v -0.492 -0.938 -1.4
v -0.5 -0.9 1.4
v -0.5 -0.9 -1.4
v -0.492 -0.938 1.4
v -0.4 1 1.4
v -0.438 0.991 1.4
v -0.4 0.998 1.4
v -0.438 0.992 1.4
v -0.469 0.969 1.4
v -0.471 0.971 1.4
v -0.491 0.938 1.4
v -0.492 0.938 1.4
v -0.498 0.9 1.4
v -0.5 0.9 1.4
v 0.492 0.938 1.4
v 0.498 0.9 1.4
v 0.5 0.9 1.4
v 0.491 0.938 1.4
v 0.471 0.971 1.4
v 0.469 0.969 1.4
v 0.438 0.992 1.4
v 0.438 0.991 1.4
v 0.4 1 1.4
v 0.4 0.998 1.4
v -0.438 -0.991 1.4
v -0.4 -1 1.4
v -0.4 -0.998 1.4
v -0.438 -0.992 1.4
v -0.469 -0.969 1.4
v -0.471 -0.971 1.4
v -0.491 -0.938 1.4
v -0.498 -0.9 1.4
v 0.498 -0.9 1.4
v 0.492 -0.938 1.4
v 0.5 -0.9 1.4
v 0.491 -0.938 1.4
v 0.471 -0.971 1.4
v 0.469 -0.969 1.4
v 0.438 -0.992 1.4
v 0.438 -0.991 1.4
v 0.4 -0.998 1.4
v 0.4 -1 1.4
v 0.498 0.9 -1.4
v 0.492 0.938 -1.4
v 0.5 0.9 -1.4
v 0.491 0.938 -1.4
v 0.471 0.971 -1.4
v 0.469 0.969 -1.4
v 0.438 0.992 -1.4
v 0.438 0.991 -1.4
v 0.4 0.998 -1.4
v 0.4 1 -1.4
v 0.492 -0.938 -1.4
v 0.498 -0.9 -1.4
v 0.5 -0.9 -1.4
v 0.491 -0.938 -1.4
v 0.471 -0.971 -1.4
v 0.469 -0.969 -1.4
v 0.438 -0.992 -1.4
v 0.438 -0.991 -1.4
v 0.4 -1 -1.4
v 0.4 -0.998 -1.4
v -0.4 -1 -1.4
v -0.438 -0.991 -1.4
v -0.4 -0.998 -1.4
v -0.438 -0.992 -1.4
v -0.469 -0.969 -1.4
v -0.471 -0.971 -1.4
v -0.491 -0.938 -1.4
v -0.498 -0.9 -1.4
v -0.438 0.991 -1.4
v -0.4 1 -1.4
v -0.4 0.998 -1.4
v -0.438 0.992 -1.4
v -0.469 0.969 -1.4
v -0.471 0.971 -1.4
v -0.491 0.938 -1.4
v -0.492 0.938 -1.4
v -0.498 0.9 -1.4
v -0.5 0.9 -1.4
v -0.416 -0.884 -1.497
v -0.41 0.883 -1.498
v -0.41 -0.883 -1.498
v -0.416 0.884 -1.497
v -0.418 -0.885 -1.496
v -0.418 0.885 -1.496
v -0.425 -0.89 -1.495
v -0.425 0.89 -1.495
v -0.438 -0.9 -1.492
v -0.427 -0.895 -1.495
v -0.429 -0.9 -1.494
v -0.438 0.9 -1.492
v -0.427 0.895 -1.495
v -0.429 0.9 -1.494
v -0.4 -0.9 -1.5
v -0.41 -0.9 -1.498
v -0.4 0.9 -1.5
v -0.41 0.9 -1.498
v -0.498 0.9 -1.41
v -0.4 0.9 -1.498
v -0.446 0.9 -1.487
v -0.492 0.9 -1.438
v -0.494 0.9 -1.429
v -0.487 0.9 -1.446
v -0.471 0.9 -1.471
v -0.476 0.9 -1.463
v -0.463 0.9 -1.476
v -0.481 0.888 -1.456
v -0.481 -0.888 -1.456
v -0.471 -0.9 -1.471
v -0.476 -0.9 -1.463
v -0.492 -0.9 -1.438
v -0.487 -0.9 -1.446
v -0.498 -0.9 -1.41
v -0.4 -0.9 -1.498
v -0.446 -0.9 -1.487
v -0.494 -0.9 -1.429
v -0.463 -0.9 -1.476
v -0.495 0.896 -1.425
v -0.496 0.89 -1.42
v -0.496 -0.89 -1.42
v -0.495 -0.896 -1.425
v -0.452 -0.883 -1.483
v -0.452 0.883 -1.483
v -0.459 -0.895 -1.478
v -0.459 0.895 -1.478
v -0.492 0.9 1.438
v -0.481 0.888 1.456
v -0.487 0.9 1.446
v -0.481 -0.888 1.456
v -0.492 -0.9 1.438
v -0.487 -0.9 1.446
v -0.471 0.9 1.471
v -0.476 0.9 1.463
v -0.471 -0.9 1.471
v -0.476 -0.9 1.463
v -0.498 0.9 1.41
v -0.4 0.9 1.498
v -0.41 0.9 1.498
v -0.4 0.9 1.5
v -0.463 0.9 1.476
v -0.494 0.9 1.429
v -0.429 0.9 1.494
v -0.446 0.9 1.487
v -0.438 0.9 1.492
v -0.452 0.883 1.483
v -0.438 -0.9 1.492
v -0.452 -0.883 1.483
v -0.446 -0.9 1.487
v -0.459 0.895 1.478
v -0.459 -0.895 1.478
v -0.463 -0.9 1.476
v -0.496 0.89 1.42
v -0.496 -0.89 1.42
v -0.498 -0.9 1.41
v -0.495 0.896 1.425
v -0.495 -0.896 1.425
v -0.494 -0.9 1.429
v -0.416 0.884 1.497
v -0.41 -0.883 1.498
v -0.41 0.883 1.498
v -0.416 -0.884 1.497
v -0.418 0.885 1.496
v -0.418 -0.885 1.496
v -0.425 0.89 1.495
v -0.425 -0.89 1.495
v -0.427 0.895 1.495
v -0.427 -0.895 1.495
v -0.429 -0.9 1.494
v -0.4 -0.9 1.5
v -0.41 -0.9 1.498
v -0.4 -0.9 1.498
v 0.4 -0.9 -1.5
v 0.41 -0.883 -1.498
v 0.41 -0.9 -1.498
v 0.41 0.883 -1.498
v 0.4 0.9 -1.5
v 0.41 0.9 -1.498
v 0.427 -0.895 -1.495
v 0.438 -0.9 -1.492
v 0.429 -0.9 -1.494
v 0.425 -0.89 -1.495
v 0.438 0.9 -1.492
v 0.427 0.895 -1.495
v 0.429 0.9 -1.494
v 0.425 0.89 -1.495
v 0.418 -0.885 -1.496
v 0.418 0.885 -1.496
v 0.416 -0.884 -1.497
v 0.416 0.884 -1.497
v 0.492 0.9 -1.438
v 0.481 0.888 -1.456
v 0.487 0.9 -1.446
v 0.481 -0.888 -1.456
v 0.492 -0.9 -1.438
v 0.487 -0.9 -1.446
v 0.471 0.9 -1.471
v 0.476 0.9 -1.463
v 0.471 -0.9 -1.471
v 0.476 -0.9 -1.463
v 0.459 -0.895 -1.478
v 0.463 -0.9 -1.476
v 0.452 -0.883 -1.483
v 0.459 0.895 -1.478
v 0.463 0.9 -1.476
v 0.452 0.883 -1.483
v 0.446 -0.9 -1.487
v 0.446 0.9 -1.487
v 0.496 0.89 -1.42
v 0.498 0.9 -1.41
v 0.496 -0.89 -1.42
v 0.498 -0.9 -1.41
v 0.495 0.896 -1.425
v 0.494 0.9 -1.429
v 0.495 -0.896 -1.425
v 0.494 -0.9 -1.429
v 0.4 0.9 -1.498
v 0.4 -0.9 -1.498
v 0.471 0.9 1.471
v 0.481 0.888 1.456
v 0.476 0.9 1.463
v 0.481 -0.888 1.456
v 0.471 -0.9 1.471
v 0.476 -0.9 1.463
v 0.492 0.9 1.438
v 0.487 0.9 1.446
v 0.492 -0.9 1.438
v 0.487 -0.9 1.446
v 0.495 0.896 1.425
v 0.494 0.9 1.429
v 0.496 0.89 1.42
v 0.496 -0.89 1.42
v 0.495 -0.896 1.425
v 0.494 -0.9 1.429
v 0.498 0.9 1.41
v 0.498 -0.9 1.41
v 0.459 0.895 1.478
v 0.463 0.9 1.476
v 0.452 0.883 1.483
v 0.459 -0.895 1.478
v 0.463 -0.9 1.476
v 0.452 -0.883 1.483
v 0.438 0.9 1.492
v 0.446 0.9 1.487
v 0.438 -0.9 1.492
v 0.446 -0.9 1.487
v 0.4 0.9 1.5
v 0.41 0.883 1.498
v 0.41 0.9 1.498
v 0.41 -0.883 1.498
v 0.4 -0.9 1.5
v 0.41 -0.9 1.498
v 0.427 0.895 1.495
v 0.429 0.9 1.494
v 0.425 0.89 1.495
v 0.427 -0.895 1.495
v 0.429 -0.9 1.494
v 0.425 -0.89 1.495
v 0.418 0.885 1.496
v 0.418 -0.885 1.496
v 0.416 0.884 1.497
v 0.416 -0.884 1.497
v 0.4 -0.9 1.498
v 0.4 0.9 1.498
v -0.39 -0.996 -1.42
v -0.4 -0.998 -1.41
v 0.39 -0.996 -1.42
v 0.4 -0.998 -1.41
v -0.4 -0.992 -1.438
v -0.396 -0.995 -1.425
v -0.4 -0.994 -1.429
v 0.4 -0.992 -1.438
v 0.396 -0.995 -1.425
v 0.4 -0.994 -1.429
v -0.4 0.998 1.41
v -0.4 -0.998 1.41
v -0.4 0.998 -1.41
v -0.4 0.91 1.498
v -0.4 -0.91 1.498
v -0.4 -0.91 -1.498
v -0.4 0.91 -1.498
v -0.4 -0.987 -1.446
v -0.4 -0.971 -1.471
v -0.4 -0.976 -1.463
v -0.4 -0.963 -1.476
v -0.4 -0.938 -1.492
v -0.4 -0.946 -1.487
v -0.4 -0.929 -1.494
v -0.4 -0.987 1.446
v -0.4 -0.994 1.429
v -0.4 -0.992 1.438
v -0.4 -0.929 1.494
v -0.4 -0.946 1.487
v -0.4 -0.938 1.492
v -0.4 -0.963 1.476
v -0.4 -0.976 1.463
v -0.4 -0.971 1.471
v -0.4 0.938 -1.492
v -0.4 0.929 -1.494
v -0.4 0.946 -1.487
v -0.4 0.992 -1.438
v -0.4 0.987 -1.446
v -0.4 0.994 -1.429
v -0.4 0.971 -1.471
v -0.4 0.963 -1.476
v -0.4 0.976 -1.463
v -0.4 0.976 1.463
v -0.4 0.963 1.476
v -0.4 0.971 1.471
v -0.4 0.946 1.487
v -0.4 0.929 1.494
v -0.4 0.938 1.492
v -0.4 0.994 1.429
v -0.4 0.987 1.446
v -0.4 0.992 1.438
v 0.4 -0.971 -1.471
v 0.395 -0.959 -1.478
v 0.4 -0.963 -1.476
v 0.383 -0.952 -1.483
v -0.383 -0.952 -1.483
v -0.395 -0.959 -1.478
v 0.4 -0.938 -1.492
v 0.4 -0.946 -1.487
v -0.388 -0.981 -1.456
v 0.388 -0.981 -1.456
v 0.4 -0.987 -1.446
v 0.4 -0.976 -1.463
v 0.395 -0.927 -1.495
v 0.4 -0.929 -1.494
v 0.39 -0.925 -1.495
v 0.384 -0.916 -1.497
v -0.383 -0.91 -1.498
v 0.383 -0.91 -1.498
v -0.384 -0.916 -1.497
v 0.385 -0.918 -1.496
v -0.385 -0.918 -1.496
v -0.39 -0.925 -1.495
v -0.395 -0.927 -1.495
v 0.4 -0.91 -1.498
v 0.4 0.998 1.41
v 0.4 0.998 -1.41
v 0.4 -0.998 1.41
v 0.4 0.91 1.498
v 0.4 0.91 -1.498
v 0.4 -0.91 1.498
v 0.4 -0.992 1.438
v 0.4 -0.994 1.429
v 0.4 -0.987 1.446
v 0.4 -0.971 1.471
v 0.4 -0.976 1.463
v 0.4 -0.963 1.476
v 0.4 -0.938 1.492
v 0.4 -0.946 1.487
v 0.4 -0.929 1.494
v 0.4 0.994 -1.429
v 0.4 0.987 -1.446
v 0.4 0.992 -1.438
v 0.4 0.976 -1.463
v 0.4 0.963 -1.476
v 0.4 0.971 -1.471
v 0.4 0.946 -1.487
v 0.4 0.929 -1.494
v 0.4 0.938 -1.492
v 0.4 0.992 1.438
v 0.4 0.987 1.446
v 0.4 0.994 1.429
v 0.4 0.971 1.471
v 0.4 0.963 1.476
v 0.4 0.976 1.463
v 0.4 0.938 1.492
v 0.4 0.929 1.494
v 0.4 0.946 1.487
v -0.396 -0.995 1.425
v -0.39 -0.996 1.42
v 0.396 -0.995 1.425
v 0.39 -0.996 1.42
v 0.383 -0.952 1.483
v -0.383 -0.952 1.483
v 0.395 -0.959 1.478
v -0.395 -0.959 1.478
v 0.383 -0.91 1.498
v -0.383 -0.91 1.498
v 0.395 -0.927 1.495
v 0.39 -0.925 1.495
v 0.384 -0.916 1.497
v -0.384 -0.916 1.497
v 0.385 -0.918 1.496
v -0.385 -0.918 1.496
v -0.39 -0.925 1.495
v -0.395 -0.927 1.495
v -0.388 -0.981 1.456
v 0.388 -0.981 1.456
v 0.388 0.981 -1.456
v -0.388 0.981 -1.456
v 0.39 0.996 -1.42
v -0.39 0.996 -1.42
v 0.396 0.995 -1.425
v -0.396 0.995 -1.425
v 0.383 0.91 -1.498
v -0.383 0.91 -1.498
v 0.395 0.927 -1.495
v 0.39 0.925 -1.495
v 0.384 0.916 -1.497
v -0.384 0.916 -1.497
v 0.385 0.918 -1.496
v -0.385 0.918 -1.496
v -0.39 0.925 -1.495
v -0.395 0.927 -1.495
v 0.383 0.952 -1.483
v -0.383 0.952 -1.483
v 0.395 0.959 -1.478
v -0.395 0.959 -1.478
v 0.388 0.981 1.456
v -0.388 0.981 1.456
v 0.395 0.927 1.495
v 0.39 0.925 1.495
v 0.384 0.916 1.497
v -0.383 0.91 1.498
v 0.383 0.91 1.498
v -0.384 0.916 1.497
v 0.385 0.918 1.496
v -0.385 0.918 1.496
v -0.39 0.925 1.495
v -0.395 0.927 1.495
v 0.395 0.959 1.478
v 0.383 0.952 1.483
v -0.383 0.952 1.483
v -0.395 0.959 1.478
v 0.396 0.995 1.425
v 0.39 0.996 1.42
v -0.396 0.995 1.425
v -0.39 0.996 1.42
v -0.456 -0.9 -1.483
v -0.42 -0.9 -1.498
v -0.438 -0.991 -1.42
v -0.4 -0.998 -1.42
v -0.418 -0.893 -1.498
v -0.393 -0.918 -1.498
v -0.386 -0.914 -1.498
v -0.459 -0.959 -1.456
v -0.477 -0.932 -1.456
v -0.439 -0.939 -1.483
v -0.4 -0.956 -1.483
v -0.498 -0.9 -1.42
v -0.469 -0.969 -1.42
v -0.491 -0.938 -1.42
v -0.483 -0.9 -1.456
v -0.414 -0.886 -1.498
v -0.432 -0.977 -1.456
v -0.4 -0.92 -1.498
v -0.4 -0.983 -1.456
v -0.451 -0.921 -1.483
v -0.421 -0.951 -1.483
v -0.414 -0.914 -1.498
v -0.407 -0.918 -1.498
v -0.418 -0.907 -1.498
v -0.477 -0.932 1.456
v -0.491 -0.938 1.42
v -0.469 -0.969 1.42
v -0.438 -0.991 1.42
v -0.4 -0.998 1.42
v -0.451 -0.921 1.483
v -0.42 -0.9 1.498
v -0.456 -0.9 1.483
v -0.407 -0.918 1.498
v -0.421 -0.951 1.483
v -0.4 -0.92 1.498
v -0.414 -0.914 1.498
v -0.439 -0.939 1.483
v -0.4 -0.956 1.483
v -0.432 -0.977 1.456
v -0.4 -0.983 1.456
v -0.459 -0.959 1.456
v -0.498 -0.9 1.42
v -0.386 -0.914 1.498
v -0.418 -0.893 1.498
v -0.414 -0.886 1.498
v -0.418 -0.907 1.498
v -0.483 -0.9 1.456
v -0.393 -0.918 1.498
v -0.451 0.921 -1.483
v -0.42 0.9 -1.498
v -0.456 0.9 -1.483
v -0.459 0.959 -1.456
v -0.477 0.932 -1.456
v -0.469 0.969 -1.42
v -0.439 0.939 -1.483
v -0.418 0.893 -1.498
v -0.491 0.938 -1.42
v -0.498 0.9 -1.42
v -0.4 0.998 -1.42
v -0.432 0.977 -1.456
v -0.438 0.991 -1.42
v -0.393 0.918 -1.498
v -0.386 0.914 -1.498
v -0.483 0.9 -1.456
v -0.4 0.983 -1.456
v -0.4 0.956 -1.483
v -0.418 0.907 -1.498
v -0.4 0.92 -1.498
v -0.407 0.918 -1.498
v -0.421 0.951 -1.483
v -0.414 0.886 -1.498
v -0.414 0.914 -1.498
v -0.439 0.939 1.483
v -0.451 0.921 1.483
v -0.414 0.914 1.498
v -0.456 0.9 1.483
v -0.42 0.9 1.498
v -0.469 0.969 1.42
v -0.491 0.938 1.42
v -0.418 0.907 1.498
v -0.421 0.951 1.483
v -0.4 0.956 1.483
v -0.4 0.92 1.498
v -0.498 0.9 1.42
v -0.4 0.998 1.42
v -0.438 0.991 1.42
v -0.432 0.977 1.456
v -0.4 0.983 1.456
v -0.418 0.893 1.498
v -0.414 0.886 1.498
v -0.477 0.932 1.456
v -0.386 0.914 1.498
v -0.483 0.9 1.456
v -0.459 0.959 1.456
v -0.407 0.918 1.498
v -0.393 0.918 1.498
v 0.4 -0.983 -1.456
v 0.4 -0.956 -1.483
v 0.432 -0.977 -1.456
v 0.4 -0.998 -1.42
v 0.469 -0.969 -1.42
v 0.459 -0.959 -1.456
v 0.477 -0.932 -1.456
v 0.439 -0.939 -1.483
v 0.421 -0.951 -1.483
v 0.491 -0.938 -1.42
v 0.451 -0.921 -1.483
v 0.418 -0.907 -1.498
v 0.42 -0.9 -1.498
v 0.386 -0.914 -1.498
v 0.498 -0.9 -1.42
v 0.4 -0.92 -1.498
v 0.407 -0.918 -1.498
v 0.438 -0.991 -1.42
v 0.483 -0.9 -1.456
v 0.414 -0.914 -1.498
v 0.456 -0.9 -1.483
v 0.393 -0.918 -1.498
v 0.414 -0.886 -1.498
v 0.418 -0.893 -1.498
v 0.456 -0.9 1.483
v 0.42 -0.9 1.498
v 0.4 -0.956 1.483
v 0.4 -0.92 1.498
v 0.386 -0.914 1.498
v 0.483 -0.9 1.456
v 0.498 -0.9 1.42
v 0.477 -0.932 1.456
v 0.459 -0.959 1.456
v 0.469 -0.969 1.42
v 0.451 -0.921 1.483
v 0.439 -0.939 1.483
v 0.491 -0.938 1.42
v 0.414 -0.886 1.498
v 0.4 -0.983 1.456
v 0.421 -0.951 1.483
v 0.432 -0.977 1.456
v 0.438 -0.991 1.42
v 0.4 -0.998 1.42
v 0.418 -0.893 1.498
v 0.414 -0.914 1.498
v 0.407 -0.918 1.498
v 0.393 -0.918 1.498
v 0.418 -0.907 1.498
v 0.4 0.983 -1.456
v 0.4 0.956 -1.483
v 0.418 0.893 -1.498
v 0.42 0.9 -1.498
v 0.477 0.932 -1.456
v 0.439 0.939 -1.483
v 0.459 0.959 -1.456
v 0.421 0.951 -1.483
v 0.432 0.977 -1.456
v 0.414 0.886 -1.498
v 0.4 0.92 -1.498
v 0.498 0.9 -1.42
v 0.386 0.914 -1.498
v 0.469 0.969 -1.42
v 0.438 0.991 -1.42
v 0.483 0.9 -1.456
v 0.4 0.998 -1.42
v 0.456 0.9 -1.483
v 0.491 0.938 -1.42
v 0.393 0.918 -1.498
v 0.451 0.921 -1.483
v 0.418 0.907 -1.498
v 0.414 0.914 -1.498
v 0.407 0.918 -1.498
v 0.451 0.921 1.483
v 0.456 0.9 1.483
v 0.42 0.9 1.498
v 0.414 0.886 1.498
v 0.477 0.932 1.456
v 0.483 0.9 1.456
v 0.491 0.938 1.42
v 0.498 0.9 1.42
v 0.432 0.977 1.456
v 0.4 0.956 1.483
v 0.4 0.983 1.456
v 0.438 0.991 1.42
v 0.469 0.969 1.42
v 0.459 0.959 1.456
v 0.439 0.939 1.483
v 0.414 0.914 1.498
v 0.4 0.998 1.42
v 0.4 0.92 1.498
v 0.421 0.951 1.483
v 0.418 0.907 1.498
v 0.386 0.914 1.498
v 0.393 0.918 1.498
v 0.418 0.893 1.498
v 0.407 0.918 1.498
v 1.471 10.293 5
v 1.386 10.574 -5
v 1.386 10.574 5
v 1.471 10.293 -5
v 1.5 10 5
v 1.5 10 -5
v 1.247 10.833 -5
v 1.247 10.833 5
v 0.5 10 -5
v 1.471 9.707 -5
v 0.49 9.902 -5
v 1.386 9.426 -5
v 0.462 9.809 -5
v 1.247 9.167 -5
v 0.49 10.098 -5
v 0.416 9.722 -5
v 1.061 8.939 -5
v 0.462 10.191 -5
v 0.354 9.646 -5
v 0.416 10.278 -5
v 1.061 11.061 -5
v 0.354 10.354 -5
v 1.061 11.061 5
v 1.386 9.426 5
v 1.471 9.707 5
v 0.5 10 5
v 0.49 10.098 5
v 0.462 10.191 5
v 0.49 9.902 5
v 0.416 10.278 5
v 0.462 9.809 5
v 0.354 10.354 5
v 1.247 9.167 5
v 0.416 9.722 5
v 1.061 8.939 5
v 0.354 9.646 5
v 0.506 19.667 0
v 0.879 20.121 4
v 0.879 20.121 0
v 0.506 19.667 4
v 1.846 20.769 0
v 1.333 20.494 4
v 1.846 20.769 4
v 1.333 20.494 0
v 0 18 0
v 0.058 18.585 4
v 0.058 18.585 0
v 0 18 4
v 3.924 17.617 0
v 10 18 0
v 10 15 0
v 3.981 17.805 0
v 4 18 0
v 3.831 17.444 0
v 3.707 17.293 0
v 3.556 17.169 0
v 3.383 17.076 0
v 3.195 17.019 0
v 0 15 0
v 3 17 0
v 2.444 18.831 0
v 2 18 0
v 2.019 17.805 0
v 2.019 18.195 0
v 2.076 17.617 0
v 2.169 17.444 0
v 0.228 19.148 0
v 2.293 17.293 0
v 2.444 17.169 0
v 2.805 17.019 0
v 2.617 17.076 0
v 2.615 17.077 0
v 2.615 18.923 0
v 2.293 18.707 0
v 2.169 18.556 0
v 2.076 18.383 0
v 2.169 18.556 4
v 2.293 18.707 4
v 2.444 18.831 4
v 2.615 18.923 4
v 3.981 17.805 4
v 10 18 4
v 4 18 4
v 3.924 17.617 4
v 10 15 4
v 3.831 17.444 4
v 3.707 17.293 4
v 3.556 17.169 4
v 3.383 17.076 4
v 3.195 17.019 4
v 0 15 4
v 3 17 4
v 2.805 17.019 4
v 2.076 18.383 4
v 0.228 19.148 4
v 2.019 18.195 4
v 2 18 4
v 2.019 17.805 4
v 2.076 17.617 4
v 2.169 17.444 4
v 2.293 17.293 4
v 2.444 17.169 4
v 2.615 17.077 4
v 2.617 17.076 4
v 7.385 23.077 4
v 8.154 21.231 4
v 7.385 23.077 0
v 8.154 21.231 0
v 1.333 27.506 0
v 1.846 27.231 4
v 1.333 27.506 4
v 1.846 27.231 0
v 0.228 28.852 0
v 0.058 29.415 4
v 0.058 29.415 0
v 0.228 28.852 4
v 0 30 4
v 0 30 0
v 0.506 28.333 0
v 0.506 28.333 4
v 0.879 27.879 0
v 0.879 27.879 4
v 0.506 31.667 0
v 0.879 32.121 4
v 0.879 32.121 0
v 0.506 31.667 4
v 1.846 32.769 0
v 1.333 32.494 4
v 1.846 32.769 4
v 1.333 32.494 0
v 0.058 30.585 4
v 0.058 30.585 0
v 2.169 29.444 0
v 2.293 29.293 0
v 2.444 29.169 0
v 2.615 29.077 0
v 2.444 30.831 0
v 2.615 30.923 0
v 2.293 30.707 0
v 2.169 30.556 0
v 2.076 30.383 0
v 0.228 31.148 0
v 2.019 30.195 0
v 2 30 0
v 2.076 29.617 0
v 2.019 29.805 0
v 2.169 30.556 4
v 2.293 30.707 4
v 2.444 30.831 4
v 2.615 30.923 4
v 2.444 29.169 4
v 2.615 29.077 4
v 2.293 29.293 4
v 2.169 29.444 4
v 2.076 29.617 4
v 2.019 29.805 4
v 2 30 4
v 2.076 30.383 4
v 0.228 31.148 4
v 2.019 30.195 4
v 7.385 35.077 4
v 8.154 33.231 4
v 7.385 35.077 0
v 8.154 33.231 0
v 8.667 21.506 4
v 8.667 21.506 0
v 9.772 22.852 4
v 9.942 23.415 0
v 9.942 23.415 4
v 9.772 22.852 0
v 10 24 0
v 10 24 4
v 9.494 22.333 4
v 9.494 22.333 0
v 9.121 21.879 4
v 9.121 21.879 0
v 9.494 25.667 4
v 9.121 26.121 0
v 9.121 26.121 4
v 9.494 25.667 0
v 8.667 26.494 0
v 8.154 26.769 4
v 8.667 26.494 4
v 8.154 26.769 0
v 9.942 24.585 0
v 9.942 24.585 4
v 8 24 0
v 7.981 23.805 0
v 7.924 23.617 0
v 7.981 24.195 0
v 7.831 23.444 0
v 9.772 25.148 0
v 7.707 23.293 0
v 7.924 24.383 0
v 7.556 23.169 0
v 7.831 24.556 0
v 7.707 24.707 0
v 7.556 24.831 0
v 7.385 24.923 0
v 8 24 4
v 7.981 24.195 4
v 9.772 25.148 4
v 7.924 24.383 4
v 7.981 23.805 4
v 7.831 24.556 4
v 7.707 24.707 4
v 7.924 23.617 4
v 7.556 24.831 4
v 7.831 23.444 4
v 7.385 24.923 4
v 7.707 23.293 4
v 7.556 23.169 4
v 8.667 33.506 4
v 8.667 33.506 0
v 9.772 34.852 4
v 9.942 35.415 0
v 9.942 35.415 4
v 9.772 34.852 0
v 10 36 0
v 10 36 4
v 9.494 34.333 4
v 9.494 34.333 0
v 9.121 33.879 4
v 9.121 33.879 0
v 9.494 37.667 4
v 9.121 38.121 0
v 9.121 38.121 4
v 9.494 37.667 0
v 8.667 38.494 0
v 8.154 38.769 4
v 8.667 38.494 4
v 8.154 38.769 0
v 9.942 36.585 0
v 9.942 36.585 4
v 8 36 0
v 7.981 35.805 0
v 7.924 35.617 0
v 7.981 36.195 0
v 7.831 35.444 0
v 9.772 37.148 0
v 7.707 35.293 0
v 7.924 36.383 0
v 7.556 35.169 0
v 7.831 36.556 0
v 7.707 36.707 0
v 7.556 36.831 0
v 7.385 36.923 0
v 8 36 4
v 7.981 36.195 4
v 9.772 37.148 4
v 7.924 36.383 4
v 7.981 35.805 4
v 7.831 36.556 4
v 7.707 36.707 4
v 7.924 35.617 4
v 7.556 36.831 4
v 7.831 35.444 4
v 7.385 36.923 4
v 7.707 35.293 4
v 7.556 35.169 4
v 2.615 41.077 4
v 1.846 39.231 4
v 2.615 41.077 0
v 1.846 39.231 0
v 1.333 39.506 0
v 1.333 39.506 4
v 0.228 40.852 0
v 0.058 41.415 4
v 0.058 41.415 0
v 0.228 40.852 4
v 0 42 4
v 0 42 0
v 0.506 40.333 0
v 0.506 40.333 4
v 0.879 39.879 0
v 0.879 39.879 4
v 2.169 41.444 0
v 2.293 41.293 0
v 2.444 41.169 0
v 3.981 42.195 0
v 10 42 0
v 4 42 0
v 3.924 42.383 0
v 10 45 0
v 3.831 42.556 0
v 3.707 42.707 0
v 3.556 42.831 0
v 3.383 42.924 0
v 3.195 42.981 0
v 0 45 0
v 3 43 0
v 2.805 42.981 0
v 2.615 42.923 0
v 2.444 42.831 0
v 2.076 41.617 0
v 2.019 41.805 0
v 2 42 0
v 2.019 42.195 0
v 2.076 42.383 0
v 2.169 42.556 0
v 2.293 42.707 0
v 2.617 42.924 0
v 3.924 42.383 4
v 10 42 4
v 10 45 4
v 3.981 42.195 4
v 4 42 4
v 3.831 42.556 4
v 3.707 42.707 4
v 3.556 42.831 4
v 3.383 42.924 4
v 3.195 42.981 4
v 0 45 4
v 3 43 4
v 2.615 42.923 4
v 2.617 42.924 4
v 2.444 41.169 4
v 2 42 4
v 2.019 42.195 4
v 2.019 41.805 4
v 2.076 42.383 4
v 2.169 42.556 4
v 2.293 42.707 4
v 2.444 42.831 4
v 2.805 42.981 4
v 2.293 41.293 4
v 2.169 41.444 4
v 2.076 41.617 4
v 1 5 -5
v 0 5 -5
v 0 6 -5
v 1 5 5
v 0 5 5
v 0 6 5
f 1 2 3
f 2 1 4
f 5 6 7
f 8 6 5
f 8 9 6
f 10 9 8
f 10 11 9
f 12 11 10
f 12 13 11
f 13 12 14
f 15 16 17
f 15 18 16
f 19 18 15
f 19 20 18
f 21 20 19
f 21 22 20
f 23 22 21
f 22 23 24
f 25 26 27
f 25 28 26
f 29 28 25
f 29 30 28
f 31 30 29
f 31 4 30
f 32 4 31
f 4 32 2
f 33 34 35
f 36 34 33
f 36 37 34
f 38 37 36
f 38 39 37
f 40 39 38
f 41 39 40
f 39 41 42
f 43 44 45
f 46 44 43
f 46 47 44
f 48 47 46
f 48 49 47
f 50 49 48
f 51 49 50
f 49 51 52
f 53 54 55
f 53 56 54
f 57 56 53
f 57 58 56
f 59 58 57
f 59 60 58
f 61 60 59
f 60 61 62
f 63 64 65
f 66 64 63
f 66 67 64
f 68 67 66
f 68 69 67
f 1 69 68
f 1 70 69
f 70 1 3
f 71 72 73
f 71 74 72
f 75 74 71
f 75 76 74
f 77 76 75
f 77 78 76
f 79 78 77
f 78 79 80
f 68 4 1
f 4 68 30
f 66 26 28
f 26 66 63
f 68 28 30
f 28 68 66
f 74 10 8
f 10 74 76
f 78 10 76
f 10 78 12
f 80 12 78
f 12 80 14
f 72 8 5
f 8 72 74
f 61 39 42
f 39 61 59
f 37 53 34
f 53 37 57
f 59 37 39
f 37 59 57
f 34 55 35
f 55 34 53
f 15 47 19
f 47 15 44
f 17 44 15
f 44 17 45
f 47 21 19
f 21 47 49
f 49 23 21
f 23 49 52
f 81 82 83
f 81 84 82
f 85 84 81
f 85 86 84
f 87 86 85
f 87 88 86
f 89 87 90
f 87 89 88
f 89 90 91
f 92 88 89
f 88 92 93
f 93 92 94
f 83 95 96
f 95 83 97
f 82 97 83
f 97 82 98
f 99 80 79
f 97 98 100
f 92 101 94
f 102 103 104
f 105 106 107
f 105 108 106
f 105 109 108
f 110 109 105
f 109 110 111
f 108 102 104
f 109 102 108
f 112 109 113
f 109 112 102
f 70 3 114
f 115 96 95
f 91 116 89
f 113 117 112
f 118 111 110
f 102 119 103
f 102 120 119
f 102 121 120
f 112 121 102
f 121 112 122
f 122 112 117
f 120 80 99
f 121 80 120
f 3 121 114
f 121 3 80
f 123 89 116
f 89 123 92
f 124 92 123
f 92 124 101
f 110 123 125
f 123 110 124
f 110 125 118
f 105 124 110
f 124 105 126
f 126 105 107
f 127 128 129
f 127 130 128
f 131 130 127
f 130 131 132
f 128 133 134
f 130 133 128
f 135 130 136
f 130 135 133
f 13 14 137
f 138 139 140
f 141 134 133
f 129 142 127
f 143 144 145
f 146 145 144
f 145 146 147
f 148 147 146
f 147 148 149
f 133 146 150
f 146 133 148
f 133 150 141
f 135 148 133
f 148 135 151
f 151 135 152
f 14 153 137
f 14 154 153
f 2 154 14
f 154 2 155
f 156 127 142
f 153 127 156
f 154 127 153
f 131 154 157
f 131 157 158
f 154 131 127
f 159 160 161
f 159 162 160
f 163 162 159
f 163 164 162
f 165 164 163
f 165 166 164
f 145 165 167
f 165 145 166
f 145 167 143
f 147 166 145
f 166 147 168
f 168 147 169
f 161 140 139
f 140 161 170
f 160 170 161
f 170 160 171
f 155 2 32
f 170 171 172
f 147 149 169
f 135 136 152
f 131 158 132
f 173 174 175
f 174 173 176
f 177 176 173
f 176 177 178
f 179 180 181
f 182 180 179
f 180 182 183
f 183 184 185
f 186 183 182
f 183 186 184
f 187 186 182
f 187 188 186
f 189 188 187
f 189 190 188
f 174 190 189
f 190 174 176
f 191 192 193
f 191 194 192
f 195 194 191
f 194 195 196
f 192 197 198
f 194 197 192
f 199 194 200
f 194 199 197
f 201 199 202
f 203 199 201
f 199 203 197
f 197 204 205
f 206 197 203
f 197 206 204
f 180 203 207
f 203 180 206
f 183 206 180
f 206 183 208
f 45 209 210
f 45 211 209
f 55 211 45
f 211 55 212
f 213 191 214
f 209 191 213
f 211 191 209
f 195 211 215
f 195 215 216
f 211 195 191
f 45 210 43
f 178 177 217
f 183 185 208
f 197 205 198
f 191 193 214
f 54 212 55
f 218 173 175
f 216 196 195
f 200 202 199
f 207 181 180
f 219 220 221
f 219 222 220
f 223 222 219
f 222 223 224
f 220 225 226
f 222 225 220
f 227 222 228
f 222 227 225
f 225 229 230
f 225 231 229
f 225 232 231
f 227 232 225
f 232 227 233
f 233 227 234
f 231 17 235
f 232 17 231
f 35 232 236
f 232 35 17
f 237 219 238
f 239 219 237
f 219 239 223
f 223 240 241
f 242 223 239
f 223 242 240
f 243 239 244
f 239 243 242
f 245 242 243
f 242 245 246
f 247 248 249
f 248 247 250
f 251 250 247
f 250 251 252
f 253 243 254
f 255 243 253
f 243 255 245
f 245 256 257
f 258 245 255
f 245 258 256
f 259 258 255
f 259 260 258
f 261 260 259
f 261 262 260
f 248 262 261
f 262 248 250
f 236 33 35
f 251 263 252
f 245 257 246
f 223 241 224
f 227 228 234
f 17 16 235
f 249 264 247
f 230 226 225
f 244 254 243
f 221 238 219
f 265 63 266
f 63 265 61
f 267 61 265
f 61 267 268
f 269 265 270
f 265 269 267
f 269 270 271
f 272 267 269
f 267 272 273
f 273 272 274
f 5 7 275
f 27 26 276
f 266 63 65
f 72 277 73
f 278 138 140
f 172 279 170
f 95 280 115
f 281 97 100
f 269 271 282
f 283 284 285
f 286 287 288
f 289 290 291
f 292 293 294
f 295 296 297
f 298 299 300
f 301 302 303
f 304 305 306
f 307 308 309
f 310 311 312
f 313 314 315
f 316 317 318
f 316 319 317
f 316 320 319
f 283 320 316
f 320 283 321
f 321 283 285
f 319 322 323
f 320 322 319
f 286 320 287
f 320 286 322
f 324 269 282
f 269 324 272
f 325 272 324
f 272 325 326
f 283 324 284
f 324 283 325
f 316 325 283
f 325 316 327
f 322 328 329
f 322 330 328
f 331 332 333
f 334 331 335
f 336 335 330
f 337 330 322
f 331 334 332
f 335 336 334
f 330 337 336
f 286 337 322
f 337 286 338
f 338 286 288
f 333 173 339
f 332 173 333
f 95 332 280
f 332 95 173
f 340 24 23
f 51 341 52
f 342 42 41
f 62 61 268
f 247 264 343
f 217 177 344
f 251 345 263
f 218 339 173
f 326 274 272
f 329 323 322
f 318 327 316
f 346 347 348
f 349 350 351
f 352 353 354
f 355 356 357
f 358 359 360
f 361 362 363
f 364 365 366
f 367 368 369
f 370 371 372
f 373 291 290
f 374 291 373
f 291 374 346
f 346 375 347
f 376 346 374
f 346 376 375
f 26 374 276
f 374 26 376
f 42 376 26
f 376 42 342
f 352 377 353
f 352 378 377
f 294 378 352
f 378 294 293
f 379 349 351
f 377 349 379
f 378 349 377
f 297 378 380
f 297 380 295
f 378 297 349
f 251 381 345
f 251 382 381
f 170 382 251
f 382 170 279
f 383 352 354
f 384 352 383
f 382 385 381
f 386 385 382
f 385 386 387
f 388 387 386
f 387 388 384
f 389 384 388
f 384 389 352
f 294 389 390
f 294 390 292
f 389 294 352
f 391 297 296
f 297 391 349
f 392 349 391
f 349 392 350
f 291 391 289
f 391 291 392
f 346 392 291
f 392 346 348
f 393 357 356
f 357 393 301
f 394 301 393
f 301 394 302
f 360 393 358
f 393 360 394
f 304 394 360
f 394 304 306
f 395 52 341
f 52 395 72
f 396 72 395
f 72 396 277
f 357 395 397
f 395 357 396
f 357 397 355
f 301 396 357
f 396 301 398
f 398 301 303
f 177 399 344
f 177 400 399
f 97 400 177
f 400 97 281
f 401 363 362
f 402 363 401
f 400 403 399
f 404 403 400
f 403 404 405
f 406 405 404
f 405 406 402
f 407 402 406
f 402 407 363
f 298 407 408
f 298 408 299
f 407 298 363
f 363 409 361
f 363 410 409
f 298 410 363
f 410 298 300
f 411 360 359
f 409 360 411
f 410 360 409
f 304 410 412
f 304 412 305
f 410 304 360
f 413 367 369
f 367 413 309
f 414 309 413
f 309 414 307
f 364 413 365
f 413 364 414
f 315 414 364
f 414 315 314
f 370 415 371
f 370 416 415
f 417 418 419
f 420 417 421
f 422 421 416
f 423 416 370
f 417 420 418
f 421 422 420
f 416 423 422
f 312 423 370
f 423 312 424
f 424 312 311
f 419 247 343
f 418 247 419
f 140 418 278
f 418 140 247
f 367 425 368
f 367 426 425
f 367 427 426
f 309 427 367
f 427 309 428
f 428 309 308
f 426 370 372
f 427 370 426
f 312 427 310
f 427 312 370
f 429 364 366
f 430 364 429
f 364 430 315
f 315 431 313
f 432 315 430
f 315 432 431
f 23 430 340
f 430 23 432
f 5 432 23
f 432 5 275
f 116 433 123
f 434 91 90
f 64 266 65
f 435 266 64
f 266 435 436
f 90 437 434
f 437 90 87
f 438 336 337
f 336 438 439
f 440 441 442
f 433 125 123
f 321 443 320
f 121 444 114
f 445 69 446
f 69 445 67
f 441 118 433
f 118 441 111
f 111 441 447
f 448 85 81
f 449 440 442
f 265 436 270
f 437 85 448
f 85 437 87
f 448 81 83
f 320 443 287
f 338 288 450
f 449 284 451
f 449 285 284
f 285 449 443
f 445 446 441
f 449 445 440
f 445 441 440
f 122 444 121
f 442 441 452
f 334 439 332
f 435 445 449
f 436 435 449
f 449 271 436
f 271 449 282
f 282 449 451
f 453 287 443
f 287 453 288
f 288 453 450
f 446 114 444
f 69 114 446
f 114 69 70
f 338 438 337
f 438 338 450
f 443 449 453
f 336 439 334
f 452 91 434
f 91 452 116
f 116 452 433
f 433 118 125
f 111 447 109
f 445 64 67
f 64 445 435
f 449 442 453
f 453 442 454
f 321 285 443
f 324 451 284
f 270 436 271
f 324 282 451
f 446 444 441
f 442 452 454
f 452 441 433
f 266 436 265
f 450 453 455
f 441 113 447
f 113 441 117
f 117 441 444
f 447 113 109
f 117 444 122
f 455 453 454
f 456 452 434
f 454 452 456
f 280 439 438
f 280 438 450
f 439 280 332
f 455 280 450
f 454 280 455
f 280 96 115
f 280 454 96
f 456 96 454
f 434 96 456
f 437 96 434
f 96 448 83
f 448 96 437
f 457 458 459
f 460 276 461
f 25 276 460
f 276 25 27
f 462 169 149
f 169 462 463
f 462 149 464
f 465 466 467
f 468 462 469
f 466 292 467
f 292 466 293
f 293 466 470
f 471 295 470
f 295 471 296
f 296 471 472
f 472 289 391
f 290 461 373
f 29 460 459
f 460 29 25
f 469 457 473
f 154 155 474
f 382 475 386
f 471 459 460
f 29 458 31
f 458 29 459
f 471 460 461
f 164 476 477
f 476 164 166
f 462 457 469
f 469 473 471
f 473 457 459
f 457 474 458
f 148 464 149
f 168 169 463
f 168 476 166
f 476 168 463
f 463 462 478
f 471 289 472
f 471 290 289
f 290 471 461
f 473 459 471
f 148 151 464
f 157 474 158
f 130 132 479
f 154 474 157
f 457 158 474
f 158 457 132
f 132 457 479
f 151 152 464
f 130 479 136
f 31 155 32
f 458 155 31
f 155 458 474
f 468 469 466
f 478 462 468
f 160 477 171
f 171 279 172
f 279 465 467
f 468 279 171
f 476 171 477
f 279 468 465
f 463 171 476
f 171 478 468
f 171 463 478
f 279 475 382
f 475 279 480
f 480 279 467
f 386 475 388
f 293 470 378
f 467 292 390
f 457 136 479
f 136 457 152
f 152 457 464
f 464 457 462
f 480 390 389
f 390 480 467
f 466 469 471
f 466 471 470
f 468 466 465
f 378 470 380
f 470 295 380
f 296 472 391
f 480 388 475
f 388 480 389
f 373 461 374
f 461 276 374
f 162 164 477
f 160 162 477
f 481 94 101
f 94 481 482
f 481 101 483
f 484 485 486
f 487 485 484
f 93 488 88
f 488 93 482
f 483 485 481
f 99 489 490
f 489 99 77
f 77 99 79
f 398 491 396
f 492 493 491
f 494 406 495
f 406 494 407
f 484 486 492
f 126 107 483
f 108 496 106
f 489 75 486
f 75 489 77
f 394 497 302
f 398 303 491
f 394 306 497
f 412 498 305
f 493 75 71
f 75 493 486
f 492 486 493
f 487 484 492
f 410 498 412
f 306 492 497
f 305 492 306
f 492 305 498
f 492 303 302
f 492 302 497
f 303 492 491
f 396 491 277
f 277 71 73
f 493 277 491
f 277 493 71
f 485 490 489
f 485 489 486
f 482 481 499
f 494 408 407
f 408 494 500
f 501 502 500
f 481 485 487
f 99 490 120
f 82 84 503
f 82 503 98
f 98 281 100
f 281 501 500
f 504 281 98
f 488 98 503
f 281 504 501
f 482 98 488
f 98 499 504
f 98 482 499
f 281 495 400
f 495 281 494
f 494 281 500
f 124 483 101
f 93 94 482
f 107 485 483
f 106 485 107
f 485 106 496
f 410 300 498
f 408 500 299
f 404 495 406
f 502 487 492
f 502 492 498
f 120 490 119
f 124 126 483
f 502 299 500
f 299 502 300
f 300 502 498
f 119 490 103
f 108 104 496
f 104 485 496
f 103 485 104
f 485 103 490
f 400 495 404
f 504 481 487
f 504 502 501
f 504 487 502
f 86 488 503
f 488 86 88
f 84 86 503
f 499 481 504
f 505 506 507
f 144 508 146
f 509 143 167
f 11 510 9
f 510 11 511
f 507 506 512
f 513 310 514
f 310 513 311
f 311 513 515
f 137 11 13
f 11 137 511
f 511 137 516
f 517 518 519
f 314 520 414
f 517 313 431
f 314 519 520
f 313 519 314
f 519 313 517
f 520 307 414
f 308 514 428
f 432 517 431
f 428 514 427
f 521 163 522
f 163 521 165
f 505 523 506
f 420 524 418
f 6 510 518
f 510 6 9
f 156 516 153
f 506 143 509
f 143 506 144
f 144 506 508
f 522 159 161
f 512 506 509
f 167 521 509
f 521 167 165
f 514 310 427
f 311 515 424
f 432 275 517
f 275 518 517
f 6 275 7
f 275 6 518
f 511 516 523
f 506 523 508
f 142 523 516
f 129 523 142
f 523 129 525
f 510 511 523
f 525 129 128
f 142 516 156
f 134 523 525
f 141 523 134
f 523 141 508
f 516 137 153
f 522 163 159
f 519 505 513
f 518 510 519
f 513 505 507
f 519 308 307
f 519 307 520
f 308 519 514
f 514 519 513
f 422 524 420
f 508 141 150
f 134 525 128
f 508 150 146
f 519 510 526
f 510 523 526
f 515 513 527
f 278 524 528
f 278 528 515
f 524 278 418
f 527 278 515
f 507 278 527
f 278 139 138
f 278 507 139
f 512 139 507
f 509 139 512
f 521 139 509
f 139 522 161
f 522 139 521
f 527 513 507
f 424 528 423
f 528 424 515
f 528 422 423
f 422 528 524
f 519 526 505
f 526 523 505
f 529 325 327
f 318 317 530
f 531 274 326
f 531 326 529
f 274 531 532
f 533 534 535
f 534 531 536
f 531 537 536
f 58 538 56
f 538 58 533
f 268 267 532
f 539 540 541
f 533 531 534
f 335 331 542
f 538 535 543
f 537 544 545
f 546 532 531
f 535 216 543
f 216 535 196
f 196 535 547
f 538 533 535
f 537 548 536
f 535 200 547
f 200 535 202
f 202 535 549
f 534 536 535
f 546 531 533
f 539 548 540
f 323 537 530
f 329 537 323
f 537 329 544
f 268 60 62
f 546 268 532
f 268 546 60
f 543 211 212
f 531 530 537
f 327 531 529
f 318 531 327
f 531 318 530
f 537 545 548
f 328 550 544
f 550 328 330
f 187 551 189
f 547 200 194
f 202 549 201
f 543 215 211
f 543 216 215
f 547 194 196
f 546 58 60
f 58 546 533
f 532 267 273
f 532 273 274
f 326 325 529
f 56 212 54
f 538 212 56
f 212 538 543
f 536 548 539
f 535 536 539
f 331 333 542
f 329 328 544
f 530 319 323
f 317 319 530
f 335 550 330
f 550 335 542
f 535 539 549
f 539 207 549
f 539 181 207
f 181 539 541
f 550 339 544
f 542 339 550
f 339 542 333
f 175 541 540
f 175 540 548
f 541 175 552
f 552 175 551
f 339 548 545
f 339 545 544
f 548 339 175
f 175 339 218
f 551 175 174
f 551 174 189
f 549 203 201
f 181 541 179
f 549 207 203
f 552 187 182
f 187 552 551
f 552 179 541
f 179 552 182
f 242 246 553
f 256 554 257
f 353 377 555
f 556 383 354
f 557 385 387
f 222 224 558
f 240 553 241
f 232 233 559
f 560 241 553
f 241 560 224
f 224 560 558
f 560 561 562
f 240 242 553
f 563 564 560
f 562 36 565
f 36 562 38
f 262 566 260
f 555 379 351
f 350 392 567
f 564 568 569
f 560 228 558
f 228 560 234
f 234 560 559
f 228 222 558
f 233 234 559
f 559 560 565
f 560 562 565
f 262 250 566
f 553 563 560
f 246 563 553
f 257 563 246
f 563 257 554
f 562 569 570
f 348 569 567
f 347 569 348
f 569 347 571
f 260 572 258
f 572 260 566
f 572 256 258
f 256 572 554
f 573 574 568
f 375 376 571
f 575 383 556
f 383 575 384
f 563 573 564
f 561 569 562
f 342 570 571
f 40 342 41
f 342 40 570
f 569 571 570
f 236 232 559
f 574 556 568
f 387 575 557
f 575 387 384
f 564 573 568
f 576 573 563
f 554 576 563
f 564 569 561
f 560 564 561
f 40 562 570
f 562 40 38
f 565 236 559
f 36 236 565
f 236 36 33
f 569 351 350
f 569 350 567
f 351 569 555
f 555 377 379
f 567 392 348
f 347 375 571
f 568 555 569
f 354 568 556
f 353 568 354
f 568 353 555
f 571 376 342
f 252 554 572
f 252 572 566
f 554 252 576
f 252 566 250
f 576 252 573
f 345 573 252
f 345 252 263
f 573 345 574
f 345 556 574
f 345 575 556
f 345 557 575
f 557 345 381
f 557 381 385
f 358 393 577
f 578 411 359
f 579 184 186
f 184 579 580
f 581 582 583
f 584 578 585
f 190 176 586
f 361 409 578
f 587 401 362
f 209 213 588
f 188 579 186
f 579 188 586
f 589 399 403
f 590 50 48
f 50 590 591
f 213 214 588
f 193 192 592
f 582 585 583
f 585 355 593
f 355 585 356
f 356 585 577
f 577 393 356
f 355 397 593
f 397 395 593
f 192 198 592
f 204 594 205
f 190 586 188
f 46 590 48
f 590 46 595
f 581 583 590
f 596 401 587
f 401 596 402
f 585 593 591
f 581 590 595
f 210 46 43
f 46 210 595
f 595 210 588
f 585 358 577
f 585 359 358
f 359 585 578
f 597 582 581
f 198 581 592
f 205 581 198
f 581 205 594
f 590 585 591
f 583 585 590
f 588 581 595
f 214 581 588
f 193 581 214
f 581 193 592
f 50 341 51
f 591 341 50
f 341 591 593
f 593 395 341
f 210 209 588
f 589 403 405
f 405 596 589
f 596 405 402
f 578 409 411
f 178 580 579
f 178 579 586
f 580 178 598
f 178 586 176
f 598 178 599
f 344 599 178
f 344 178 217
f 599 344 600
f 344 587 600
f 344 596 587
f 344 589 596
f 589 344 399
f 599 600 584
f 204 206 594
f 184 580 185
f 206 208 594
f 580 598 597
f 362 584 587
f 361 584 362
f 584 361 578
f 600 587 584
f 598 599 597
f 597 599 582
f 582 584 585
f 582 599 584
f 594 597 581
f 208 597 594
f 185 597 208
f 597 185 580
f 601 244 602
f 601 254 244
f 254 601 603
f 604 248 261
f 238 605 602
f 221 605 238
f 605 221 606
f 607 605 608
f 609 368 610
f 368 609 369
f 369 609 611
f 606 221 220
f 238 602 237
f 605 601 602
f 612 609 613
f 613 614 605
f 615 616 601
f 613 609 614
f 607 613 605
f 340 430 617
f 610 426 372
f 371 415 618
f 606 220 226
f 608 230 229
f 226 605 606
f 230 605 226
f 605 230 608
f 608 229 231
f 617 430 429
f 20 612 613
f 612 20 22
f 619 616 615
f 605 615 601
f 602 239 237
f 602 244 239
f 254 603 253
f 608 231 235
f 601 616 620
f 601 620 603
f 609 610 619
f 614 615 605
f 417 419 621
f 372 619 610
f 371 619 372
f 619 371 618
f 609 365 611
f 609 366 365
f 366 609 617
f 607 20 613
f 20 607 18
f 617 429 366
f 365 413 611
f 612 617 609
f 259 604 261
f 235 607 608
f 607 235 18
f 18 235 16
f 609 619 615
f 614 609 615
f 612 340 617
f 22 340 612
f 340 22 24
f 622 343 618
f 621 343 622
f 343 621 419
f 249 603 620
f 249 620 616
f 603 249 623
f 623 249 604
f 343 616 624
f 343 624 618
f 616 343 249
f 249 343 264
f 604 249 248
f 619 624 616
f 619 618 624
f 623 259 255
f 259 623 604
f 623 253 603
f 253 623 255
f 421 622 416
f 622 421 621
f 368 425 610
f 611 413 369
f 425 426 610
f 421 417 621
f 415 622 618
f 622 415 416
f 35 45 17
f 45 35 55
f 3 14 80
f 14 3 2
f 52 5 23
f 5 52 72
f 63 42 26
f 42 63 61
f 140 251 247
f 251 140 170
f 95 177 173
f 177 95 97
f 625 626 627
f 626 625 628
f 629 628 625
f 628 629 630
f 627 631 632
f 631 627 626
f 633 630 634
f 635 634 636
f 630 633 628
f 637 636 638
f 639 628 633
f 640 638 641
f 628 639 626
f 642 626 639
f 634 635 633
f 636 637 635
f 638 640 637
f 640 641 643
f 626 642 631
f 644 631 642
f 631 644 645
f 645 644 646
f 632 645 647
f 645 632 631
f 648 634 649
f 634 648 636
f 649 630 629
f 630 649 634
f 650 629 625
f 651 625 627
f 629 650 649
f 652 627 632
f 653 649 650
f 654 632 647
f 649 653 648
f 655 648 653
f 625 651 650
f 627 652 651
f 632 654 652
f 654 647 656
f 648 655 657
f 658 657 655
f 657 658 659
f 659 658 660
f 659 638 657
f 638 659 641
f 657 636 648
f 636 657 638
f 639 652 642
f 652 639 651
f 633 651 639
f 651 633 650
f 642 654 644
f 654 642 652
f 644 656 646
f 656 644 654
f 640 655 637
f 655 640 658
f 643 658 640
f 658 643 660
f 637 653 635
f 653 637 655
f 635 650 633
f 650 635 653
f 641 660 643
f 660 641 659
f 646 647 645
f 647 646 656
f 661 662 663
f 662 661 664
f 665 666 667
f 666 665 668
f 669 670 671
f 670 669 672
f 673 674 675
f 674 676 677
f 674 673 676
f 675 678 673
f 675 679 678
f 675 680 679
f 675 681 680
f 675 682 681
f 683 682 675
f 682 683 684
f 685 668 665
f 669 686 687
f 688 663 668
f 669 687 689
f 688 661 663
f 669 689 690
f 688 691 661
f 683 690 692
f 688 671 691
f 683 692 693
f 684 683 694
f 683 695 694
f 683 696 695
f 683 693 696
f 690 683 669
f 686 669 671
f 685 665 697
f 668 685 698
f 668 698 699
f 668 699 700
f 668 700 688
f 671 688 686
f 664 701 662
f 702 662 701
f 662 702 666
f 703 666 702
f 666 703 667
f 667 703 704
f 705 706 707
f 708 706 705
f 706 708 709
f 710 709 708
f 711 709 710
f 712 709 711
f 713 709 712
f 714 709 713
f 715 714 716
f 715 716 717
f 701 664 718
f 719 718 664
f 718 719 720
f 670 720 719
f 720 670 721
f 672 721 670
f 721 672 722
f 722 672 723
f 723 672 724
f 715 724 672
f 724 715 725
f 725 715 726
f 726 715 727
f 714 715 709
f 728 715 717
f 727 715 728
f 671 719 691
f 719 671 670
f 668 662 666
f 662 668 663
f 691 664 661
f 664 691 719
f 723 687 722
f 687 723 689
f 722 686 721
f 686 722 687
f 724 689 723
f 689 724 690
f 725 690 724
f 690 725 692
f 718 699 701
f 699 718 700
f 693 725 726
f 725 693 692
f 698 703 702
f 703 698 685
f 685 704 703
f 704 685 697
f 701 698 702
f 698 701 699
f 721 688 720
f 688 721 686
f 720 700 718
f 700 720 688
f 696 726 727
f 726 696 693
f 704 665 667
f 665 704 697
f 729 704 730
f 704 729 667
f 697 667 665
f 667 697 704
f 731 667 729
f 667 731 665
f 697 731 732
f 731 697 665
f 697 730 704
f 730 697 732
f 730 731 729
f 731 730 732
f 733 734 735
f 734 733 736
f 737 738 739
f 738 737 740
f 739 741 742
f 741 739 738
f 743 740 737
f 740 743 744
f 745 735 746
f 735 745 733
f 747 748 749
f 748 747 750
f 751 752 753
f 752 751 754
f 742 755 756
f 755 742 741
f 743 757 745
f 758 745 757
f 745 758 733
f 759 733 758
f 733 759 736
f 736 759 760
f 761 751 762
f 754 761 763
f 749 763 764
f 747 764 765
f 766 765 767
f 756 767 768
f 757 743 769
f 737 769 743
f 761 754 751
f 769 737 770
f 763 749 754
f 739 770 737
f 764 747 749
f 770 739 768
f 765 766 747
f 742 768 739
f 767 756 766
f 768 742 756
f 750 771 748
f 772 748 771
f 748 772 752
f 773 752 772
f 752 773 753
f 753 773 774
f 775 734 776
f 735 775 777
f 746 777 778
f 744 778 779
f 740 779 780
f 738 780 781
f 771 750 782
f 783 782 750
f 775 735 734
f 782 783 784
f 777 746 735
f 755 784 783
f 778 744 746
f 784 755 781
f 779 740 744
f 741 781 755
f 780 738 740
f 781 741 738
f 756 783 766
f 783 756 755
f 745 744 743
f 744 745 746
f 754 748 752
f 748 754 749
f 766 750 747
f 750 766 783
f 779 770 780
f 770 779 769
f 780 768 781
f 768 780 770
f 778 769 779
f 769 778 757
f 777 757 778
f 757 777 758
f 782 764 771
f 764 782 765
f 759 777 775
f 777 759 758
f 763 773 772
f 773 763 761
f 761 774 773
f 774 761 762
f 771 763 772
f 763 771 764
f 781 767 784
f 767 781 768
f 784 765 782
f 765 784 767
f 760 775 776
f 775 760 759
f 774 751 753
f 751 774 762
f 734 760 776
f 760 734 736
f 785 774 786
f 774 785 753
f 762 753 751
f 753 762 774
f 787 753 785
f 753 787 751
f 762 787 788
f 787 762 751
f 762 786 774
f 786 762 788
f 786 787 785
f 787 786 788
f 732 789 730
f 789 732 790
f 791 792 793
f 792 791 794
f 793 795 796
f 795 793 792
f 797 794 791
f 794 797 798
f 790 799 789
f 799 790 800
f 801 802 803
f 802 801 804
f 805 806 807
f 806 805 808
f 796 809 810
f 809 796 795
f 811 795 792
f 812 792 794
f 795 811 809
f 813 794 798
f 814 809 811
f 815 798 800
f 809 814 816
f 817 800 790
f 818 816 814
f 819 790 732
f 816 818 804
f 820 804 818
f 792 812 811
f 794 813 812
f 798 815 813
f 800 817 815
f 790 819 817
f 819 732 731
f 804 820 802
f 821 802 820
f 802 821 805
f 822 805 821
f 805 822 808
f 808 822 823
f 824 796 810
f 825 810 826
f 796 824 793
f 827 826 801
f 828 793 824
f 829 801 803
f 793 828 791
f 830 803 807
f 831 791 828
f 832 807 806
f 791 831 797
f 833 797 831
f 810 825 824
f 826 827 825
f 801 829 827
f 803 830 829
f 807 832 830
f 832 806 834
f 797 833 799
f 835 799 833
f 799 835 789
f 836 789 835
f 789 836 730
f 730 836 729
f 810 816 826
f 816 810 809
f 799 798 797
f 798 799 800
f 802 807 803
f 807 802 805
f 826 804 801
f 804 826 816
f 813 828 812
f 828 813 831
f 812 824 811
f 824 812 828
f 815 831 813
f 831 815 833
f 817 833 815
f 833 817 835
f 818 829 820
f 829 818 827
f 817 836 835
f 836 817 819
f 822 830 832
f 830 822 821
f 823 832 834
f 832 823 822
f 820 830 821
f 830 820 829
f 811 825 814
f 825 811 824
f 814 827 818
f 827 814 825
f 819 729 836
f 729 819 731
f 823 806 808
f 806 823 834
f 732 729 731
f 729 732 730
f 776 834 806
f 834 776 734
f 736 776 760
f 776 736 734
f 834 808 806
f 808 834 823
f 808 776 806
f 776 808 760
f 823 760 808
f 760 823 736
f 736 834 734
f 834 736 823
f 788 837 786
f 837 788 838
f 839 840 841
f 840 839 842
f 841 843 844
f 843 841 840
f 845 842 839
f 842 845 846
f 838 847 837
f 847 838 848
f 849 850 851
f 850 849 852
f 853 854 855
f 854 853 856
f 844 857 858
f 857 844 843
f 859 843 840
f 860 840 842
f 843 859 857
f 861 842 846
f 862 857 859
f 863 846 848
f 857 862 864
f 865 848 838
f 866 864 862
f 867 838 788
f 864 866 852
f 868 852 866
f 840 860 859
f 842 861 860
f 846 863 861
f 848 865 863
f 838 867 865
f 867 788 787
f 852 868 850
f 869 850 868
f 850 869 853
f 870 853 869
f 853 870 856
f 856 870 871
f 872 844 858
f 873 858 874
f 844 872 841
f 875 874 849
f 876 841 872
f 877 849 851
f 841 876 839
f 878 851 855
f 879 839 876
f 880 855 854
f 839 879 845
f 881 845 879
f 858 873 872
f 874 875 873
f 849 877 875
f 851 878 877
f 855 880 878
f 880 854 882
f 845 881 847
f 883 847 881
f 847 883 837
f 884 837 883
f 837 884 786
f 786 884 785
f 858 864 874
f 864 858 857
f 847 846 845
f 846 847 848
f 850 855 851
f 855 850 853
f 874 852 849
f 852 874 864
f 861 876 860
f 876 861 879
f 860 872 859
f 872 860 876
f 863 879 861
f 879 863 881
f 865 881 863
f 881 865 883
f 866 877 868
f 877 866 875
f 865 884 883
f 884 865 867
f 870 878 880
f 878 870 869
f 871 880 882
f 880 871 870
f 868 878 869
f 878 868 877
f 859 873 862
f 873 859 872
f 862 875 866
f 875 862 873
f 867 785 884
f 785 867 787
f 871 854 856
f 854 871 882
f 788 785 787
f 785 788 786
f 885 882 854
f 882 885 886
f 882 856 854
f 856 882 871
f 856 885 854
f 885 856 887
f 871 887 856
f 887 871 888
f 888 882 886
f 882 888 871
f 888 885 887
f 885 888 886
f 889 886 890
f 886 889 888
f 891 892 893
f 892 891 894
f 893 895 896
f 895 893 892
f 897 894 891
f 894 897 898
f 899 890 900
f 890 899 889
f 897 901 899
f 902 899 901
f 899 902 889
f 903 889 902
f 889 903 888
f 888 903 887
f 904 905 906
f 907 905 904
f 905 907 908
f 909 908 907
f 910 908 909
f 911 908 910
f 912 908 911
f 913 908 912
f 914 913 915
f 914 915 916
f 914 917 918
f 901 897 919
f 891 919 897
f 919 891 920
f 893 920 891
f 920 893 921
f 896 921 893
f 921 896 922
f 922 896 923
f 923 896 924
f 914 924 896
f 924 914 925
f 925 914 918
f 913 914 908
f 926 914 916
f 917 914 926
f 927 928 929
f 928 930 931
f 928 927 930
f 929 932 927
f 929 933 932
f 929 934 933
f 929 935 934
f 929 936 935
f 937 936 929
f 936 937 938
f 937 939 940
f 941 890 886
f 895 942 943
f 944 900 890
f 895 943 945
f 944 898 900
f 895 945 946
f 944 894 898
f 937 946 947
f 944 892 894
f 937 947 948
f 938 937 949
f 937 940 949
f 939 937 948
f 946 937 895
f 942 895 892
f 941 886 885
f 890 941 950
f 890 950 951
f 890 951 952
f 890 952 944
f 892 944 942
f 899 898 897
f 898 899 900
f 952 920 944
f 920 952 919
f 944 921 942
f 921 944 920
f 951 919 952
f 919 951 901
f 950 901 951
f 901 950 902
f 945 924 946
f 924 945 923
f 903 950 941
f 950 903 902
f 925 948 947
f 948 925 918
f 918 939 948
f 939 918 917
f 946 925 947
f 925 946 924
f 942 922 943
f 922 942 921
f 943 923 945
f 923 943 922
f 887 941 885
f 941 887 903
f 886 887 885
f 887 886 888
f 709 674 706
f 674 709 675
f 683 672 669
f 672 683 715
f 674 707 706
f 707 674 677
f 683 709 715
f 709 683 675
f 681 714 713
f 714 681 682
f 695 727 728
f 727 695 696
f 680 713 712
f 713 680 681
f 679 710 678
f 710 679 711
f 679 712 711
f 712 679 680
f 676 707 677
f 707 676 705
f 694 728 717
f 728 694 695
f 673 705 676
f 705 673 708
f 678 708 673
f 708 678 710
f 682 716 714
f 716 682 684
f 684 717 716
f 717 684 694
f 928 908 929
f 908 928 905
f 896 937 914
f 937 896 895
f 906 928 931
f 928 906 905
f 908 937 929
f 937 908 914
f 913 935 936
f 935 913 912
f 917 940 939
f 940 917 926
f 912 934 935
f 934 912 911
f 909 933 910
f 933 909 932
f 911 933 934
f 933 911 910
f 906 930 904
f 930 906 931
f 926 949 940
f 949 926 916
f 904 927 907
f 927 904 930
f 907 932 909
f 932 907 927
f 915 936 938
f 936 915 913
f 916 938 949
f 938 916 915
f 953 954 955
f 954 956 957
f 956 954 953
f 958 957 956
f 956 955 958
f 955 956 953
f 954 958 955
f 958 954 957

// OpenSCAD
// linurs body
// body lets create mode advanced bodies as the standard ones from OpenSCAD as cube cylinder sphere and polyhedron

module prism(face=[[0,0],[1,0],[0,1]], h=1, center=false){  
  linear_extrude(height = h, center = center)
  polygon(points = [ face[0], face[1], face[2]], paths = [ [0, 1, 2]]);   
}
//prism();

module roundcube(size=[1,1,1], r=0.1, center=false, $fn=8){
  t = center==true ? 0 : 1; 
  translate([size[0]/2*t,size[1]/2*t,size[2]/2*t])
  union(){
    cube(size=[size[0],size[1]-2*r,size[2]-2*r],center=true);
    cube(size=[size[0]-2*r,size[1],size[2]-2*r],center=true);
    cube(size=[size[0]-2*r,size[1]-2*r,size[2]],center=true);

    for(x=[-size[0]/2+r,size[0]/2-r]){
      for(y=[-size[1]/2+r,size[1]/2-r]){
        translate([x,y,0])
          cylinder(r=r,h=size[2]-2*r, center=true,$fn=$fn);   
      }
    }

    for(x=[-size[0]/2+r,size[0]/2-r]){
      for(z=[-size[2]/2+r,size[2]/2-r]){
        translate([x,0,z])
          rotate([90,0,0])
          cylinder(r=r,h=size[1]-2*r, center=true,$fn=$fn);   
      }
    }


    for(y=[-size[1]/2+r,size[1]/2-r]){
      for(z=[-size[2]/2+r,size[2]/2-r]){
        translate([0,y,z])
          rotate([0,90,0])
          cylinder(r=r,h=size[0]-2*r, center=true,$fn=$fn);   
      }
    }

    for(x=[-size[0]/2+r,size[0]/2-r]){
      for(y=[-size[1]/2+r,size[1]/2-r]){
        for(z=[-size[2]/2+r,size[2]/2-r]){
          translate([x,y,z])
            sphere(r=r, $fn=$fn);   
        }
      }
    }
  }
}

module channel(d1=1,d2=3,h=10,a=90, center=false, $fn=32){
   intersection(){     
            difference(){
                cylinder(d=d2,h=h,center=true,$fn=$fn);
                cylinder(d=d1,h=2*h,center=true,$fn=$fn);      
            }
            if((a<180)&&(a>0)){
               t=0.5*d2*tan(a/2); 
               linear_extrude(height=2*h, center = true){
                   polygon(points=[
                                  [0,0],
                                  [d2/2,t],
                                  [d2/2,-t]
                                  ], paths=[[0,1,2]]);       
                }
            }    
            else if(a==180){
               translate([0,d2/2,0])cube([d2/2,d2,2*h]); 
            }    
   }
}

module springelement(x=0, y=0, t=1, s=2, x1=0, y1=0, a=0, l=10, m=0, e=0){
    h=1.5*s/tan(a);
    mirror([m,0,0])translate([-x,y,0]){
        rotate([0,0,180])channel(d1=2,
                d2=3*s,
                h=t,
                a=180-2*a);
        if(e==0){
                translate([x1,y1,-t/2])rotate([0,0,a])cube([l,s,t]);
        }        
    }
}    


module spring(s=2,d=[10,10,1],n=2){
//x center x
//y center y
//z tickness    
//s width of spring rods
    r1=s/2;
    r2=1.5*s;
    
    xi=d.x-3*s; // inner x circle center x
    yi=(d.y-3*s)/n/2;     // inner x circle center x
         
    c=sqrt(pow(xi,2)+pow(yi,2)); // distance between center
    c1=c/(1+r2/r1); // where spring rod cuts line between the two circle centers
    l1=sqrt(pow(c1,2)-pow(r1,2));    
    c2=c-c1;
    l2=sqrt(pow(c2,2)-pow(r2,2));
    l=l1+l2;
    a1=atan(yi/xi);
    a2=acos(r1/c1);
    a3=180-a2-a1;
    a4=90-a3;
    x1=-r1*cos(a3);
    y1=r1*sin(a3);
    
 
    translate([1.5*s,1.5*s,d.z/2]){
    for(i=[0:n-1]){
           springelement(x=0,y=i*yi*2,s=s,t=d.z, x1=x1, y1=y1, a=a4, l=l, m=0);        
    }
    for(i=[0:n-1]){
           springelement(x=xi,y=(2*i+1)*yi,s=s, t=d.z, x1=x1, y1=y1, a=a4, l=l, m=1);        
    }
    springelement(x=0,y=d.y-3*s,s=s,t=d.z, x1=x1, y1=y1, a=a4, l=l, m=0, e=1);
    }
    for(i=[0,1]){
      translate([0,i*d.y,0])mirror([0,i,0])difference(){
          cube([d.x,1.5*s,d.z]);
          translate([1.5*s,1.5*s,0])cylinder(d=s,h=3*d.z,center=true,$fn=32);
      } 
    }    
}



//
roundcube(size=[1,2,3],center=true, $fn=16);
//
translate([0,5,0])prism(h=10,center=true);
//
translate([0,10,0])channel();
//
translate([0,15,0]) spring(d=[10,30,4],n=2, s=2);
